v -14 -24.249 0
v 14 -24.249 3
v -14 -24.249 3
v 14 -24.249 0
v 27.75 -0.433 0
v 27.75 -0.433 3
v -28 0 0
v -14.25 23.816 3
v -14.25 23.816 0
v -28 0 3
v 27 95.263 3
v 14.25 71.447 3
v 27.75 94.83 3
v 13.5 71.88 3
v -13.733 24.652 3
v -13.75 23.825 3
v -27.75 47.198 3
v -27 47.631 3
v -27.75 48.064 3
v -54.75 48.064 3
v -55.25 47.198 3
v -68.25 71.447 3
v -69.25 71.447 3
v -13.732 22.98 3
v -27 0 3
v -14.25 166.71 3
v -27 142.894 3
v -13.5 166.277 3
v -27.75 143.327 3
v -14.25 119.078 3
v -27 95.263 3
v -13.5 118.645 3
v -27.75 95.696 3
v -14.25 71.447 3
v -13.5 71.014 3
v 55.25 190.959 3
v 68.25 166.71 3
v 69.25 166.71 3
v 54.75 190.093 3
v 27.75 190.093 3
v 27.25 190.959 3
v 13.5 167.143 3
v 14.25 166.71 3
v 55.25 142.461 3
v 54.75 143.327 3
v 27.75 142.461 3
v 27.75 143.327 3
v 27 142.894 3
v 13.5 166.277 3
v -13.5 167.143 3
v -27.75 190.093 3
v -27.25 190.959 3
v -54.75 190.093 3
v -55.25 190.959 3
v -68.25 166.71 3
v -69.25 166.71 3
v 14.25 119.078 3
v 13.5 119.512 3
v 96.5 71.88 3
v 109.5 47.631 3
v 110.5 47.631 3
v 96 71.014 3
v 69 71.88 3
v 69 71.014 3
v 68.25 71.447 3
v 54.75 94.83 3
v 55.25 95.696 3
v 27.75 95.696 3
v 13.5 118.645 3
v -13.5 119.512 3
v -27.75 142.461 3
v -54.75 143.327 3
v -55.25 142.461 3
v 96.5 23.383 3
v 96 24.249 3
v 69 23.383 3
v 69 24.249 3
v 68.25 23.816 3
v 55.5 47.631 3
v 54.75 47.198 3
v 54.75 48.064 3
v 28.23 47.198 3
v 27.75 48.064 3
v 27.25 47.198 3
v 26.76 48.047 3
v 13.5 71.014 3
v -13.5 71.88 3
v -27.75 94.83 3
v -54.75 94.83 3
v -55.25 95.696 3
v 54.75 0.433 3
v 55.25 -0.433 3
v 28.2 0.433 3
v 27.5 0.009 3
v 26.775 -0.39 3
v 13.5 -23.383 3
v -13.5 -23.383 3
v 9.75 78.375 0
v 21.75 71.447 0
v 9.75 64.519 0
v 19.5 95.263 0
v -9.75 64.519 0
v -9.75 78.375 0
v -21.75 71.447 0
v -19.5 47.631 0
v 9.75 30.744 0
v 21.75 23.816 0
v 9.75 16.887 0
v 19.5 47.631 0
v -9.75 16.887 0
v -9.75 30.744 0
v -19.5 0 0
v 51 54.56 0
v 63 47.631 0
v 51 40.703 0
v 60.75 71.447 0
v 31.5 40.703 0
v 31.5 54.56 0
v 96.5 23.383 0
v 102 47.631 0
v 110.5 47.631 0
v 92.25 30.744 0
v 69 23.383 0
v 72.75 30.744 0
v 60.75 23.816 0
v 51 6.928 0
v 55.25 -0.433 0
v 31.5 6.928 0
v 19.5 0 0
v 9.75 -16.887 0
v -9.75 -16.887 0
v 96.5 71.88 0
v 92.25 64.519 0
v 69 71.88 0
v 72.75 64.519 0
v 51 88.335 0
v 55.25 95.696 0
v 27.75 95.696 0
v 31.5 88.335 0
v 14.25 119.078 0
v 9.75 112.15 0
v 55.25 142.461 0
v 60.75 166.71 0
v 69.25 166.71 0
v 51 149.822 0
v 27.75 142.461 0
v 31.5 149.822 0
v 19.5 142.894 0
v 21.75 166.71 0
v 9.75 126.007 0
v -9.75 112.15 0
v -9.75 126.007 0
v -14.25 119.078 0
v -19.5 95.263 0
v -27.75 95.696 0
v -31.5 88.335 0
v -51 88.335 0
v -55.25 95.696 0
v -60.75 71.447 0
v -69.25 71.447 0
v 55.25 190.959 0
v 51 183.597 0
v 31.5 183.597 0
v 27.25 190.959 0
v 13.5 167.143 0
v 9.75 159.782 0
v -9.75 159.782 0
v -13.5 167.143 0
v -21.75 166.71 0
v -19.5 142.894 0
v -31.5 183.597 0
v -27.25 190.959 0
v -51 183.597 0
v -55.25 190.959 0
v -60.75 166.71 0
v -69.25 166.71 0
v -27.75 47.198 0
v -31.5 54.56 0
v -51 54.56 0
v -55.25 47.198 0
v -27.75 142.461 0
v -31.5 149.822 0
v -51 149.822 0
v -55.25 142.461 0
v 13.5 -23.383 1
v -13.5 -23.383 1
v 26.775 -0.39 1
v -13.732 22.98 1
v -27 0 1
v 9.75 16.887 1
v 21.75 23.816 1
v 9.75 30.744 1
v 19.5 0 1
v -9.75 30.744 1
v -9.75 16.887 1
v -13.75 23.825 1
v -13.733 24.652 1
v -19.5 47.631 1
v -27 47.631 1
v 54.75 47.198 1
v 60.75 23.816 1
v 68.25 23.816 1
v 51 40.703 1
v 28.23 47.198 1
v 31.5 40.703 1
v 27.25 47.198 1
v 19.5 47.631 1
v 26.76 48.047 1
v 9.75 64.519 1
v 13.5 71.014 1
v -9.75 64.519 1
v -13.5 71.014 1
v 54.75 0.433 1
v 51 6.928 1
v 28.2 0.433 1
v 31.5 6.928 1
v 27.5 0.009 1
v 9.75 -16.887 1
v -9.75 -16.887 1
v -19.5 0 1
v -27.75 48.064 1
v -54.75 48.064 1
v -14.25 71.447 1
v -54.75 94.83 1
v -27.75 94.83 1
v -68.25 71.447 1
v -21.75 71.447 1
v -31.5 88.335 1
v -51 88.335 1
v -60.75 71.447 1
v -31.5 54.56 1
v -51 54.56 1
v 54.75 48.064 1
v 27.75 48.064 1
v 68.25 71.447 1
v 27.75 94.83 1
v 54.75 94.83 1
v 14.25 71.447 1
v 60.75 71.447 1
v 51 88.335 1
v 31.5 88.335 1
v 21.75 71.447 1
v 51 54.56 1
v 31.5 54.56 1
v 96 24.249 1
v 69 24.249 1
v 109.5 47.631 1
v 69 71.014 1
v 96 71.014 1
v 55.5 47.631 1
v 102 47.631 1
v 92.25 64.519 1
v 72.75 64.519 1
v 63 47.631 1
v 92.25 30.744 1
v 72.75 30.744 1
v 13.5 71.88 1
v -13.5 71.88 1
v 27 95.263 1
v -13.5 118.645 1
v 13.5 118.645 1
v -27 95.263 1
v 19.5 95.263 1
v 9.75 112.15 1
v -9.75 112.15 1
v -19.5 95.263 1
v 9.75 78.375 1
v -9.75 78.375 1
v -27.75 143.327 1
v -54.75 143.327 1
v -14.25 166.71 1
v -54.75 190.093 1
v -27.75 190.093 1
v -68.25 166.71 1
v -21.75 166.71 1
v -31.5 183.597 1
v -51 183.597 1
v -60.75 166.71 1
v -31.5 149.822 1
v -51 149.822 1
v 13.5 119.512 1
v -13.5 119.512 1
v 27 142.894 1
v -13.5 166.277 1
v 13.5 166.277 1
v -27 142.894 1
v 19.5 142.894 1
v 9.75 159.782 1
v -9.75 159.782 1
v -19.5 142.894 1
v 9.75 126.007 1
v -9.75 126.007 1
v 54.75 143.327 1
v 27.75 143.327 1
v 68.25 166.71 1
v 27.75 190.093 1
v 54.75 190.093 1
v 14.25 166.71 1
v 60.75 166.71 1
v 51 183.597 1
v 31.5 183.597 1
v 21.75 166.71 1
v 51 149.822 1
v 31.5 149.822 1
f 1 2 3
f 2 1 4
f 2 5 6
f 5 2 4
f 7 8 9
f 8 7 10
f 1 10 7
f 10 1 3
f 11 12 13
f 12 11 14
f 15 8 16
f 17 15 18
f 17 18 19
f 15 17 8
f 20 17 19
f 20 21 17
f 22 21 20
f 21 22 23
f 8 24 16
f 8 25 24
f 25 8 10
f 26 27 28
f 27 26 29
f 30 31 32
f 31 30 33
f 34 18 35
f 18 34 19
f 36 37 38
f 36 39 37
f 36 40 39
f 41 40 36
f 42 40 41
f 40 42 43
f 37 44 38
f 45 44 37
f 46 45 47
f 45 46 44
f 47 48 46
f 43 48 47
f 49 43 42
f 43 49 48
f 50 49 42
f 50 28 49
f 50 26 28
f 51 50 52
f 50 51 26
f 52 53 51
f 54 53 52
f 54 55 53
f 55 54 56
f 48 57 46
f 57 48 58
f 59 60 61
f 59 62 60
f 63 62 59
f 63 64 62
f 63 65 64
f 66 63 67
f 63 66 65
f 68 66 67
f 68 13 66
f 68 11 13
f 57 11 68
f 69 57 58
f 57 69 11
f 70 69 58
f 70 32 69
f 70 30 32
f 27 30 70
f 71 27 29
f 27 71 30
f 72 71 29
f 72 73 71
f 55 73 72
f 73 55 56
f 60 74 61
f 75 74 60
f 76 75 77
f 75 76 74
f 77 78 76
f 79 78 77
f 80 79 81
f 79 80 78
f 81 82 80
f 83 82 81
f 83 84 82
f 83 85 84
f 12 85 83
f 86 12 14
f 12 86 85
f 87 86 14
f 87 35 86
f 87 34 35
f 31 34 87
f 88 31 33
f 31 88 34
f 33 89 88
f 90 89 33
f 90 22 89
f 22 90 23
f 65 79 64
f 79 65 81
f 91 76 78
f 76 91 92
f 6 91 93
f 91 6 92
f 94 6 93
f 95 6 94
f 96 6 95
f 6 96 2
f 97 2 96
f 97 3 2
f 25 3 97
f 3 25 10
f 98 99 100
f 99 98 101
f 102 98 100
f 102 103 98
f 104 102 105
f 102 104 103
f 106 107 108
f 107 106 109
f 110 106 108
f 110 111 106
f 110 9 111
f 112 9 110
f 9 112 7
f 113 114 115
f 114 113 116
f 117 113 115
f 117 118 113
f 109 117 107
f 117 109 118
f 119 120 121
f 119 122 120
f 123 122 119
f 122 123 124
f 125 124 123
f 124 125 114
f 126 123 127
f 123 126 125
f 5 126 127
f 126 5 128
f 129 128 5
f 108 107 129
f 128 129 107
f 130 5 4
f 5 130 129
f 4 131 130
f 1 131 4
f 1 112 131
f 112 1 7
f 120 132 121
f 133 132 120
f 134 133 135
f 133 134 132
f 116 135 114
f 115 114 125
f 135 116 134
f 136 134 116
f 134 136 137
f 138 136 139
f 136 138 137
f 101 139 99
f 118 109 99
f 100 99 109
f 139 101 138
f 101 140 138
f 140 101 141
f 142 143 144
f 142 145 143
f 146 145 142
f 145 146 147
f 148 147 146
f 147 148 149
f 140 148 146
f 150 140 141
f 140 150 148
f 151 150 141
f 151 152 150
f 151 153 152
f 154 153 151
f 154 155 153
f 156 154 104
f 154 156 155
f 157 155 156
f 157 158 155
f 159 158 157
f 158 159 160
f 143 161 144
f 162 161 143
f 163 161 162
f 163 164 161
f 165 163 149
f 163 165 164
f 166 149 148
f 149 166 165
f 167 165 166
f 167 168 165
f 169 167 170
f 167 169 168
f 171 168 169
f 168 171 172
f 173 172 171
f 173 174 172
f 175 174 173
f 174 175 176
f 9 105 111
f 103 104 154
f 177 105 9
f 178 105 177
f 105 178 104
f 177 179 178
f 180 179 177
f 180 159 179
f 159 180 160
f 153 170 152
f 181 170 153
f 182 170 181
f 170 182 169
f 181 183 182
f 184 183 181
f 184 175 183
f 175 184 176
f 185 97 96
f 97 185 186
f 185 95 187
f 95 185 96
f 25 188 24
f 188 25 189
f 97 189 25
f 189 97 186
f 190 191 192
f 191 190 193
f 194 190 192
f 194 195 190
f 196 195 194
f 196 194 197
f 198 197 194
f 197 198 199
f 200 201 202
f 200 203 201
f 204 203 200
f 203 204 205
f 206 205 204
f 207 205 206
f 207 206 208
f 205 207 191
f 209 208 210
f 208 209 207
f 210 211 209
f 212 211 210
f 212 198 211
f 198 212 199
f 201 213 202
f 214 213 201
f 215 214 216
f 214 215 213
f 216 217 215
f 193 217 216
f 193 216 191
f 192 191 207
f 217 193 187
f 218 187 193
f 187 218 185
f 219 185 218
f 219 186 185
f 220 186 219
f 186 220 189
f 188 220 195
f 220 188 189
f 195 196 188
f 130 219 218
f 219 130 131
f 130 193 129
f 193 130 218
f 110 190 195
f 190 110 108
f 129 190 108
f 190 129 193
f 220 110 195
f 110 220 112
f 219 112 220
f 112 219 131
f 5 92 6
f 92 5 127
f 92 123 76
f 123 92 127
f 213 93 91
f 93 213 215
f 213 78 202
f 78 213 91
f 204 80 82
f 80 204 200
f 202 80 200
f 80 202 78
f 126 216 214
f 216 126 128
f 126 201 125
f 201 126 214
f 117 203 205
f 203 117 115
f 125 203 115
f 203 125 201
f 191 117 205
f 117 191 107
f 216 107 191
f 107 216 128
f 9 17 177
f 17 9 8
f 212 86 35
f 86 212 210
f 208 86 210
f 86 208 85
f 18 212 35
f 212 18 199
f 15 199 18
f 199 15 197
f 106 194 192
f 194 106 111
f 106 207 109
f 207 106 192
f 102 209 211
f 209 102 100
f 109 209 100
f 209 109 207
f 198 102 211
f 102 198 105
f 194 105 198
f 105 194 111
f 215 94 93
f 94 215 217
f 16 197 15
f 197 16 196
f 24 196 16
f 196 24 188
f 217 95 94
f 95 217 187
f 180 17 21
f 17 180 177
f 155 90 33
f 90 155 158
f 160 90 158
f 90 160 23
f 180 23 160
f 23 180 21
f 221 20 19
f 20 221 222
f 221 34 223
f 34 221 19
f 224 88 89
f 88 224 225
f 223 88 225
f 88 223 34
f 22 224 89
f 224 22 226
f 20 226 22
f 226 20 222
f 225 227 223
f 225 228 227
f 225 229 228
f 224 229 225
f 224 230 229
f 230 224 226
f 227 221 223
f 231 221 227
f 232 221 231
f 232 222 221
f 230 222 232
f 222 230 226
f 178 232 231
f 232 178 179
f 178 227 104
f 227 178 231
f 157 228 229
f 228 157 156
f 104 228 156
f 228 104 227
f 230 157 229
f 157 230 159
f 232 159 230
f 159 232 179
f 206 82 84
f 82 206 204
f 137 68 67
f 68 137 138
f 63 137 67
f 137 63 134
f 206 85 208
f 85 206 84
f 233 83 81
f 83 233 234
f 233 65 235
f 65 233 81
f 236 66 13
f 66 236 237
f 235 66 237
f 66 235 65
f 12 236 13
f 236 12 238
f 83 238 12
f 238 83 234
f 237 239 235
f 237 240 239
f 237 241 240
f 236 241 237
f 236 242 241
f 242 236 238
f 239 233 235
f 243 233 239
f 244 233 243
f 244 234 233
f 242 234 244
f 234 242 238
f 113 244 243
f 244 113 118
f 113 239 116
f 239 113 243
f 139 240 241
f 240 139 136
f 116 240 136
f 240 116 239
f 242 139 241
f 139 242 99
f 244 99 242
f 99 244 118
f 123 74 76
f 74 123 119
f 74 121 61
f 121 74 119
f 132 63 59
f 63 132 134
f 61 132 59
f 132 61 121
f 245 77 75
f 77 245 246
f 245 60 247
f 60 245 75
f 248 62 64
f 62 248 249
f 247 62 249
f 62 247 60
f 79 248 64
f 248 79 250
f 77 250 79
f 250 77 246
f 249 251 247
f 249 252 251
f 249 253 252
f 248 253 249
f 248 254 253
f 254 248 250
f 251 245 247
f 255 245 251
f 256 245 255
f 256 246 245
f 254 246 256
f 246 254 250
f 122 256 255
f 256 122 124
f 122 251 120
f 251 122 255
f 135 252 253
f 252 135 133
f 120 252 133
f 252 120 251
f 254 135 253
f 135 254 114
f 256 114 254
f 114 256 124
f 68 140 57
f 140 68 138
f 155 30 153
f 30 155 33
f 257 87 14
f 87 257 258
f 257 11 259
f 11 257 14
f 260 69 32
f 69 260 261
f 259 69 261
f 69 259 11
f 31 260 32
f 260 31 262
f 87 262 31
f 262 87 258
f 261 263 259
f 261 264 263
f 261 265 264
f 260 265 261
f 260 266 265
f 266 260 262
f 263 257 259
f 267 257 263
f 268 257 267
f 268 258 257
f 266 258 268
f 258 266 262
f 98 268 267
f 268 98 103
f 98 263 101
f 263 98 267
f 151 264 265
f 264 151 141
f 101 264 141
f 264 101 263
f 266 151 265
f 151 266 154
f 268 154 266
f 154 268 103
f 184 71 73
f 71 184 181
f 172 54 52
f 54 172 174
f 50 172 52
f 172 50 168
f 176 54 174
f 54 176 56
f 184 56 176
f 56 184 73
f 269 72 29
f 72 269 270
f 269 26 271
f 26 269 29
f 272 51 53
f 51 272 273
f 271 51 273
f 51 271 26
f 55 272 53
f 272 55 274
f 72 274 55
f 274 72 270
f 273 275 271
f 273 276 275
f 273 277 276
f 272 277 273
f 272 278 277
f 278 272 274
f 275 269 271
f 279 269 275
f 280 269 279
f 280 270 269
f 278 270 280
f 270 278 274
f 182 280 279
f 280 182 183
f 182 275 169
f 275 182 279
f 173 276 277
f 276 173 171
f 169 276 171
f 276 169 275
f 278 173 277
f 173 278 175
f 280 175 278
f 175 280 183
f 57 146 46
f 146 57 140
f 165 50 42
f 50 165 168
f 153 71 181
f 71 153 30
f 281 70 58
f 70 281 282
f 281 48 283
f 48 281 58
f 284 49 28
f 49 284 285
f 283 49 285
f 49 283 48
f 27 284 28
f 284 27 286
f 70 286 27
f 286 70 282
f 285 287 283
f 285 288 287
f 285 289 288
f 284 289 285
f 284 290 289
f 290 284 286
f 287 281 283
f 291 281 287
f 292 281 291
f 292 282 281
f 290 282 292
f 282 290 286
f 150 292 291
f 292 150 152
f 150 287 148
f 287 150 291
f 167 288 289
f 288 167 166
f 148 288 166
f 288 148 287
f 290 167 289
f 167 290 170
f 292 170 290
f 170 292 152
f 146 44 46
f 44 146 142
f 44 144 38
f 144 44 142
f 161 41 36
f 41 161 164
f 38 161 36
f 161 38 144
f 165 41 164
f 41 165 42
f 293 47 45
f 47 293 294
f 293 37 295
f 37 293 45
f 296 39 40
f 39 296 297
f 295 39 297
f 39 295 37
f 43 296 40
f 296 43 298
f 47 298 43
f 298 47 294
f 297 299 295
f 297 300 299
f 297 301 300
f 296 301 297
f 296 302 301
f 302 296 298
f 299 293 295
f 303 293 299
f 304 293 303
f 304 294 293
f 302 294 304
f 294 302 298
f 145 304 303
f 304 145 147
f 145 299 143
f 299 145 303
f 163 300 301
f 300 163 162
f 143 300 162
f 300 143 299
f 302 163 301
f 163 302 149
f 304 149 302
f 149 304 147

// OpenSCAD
$fn = 150;

union() {
	difference() {
		union() {
			translate(v = [0.0, 0.0, 0]) {
				difference() {
					cylinder($fn = 6, d = 56.0, h = 3.0);
					translate(v = [0, 0, 1.0]) {
						cylinder($fn = 6, d = 54.0, h = 3.0);
					}
					translate(v = [0, 0, -1]) {
						cylinder($fn = 6, d = 39, h = 3.0);
					}
				}
			}
			translate(v = [41.25, 23.81569860407206, 0]) {
				difference() {
					cylinder($fn = 6, d = 56.0, h = 3.0);
					translate(v = [0, 0, 1.0]) {
						cylinder($fn = 6, d = 54.0, h = 3.0);
					}
					translate(v = [0, 0, -1]) {
						cylinder($fn = 6, d = 39, h = 3.0);
					}
				}
			}
			translate(v = [0.0, 47.63139720814412, 0]) {
				difference() {
					cylinder($fn = 6, d = 56.0, h = 3.0);
					translate(v = [0, 0, 1.0]) {
						cylinder($fn = 6, d = 54.0, h = 3.0);
					}
					translate(v = [0, 0, -1]) {
						cylinder($fn = 6, d = 39, h = 3.0);
					}
				}
			}
		}
		translate(v = [13.75, 23.824673200287624, 1.0]) {
			cylinder(d = 55.0, h = 3.5);
		}
	}
	translate(v = [-41.25, 71.44709581221619, 0]) {
		difference() {
			cylinder($fn = 6, d = 56.0, h = 3.0);
			translate(v = [0, 0, 1.0]) {
				cylinder($fn = 6, d = 54.0, h = 3.0);
			}
			translate(v = [0, 0, -1]) {
				cylinder($fn = 6, d = 39, h = 3.0);
			}
		}
	}
	translate(v = [41.25, 71.44709581221619, 0]) {
		difference() {
			cylinder($fn = 6, d = 56.0, h = 3.0);
			translate(v = [0, 0, 1.0]) {
				cylinder($fn = 6, d = 54.0, h = 3.0);
			}
			translate(v = [0, 0, -1]) {
				cylinder($fn = 6, d = 39, h = 3.0);
			}
		}
	}
	translate(v = [82.5, 47.63139720814412, 0]) {
		difference() {
			cylinder($fn = 6, d = 56.0, h = 3.0);
			translate(v = [0, 0, 1.0]) {
				cylinder($fn = 6, d = 54.0, h = 3.0);
			}
			translate(v = [0, 0, -1]) {
				cylinder($fn = 6, d = 39, h = 3.0);
			}
		}
	}
	translate(v = [0.0, 95.26279441628824, 0]) {
		difference() {
			cylinder($fn = 6, d = 56.0, h = 3.0);
			translate(v = [0, 0, 1.0]) {
				cylinder($fn = 6, d = 54.0, h = 3.0);
			}
			translate(v = [0, 0, -1]) {
				cylinder($fn = 6, d = 39, h = 3.0);
			}
		}
	}
	translate(v = [-41.25, 166.70989022850443, 0]) {
		difference() {
			cylinder($fn = 6, d = 56.0, h = 3.0);
			translate(v = [0, 0, 1.0]) {
				cylinder($fn = 6, d = 54.0, h = 3.0);
			}
			translate(v = [0, 0, -1]) {
				cylinder($fn = 6, d = 39, h = 3.0);
			}
		}
	}
	translate(v = [0.0, 142.89419162443238, 0]) {
		difference() {
			cylinder($fn = 6, d = 56.0, h = 3.0);
			translate(v = [0, 0, 1.0]) {
				cylinder($fn = 6, d = 54.0, h = 3.0);
			}
			translate(v = [0, 0, -1]) {
				cylinder($fn = 6, d = 39, h = 3.0);
			}
		}
	}
	translate(v = [41.25, 166.70989022850443, 0]) {
		difference() {
			cylinder($fn = 6, d = 56.0, h = 3.0);
			translate(v = [0, 0, 1.0]) {
				cylinder($fn = 6, d = 54.0, h = 3.0);
			}
			translate(v = [0, 0, -1]) {
				cylinder($fn = 6, d = 39, h = 3.0);
			}
		}
	}
}
